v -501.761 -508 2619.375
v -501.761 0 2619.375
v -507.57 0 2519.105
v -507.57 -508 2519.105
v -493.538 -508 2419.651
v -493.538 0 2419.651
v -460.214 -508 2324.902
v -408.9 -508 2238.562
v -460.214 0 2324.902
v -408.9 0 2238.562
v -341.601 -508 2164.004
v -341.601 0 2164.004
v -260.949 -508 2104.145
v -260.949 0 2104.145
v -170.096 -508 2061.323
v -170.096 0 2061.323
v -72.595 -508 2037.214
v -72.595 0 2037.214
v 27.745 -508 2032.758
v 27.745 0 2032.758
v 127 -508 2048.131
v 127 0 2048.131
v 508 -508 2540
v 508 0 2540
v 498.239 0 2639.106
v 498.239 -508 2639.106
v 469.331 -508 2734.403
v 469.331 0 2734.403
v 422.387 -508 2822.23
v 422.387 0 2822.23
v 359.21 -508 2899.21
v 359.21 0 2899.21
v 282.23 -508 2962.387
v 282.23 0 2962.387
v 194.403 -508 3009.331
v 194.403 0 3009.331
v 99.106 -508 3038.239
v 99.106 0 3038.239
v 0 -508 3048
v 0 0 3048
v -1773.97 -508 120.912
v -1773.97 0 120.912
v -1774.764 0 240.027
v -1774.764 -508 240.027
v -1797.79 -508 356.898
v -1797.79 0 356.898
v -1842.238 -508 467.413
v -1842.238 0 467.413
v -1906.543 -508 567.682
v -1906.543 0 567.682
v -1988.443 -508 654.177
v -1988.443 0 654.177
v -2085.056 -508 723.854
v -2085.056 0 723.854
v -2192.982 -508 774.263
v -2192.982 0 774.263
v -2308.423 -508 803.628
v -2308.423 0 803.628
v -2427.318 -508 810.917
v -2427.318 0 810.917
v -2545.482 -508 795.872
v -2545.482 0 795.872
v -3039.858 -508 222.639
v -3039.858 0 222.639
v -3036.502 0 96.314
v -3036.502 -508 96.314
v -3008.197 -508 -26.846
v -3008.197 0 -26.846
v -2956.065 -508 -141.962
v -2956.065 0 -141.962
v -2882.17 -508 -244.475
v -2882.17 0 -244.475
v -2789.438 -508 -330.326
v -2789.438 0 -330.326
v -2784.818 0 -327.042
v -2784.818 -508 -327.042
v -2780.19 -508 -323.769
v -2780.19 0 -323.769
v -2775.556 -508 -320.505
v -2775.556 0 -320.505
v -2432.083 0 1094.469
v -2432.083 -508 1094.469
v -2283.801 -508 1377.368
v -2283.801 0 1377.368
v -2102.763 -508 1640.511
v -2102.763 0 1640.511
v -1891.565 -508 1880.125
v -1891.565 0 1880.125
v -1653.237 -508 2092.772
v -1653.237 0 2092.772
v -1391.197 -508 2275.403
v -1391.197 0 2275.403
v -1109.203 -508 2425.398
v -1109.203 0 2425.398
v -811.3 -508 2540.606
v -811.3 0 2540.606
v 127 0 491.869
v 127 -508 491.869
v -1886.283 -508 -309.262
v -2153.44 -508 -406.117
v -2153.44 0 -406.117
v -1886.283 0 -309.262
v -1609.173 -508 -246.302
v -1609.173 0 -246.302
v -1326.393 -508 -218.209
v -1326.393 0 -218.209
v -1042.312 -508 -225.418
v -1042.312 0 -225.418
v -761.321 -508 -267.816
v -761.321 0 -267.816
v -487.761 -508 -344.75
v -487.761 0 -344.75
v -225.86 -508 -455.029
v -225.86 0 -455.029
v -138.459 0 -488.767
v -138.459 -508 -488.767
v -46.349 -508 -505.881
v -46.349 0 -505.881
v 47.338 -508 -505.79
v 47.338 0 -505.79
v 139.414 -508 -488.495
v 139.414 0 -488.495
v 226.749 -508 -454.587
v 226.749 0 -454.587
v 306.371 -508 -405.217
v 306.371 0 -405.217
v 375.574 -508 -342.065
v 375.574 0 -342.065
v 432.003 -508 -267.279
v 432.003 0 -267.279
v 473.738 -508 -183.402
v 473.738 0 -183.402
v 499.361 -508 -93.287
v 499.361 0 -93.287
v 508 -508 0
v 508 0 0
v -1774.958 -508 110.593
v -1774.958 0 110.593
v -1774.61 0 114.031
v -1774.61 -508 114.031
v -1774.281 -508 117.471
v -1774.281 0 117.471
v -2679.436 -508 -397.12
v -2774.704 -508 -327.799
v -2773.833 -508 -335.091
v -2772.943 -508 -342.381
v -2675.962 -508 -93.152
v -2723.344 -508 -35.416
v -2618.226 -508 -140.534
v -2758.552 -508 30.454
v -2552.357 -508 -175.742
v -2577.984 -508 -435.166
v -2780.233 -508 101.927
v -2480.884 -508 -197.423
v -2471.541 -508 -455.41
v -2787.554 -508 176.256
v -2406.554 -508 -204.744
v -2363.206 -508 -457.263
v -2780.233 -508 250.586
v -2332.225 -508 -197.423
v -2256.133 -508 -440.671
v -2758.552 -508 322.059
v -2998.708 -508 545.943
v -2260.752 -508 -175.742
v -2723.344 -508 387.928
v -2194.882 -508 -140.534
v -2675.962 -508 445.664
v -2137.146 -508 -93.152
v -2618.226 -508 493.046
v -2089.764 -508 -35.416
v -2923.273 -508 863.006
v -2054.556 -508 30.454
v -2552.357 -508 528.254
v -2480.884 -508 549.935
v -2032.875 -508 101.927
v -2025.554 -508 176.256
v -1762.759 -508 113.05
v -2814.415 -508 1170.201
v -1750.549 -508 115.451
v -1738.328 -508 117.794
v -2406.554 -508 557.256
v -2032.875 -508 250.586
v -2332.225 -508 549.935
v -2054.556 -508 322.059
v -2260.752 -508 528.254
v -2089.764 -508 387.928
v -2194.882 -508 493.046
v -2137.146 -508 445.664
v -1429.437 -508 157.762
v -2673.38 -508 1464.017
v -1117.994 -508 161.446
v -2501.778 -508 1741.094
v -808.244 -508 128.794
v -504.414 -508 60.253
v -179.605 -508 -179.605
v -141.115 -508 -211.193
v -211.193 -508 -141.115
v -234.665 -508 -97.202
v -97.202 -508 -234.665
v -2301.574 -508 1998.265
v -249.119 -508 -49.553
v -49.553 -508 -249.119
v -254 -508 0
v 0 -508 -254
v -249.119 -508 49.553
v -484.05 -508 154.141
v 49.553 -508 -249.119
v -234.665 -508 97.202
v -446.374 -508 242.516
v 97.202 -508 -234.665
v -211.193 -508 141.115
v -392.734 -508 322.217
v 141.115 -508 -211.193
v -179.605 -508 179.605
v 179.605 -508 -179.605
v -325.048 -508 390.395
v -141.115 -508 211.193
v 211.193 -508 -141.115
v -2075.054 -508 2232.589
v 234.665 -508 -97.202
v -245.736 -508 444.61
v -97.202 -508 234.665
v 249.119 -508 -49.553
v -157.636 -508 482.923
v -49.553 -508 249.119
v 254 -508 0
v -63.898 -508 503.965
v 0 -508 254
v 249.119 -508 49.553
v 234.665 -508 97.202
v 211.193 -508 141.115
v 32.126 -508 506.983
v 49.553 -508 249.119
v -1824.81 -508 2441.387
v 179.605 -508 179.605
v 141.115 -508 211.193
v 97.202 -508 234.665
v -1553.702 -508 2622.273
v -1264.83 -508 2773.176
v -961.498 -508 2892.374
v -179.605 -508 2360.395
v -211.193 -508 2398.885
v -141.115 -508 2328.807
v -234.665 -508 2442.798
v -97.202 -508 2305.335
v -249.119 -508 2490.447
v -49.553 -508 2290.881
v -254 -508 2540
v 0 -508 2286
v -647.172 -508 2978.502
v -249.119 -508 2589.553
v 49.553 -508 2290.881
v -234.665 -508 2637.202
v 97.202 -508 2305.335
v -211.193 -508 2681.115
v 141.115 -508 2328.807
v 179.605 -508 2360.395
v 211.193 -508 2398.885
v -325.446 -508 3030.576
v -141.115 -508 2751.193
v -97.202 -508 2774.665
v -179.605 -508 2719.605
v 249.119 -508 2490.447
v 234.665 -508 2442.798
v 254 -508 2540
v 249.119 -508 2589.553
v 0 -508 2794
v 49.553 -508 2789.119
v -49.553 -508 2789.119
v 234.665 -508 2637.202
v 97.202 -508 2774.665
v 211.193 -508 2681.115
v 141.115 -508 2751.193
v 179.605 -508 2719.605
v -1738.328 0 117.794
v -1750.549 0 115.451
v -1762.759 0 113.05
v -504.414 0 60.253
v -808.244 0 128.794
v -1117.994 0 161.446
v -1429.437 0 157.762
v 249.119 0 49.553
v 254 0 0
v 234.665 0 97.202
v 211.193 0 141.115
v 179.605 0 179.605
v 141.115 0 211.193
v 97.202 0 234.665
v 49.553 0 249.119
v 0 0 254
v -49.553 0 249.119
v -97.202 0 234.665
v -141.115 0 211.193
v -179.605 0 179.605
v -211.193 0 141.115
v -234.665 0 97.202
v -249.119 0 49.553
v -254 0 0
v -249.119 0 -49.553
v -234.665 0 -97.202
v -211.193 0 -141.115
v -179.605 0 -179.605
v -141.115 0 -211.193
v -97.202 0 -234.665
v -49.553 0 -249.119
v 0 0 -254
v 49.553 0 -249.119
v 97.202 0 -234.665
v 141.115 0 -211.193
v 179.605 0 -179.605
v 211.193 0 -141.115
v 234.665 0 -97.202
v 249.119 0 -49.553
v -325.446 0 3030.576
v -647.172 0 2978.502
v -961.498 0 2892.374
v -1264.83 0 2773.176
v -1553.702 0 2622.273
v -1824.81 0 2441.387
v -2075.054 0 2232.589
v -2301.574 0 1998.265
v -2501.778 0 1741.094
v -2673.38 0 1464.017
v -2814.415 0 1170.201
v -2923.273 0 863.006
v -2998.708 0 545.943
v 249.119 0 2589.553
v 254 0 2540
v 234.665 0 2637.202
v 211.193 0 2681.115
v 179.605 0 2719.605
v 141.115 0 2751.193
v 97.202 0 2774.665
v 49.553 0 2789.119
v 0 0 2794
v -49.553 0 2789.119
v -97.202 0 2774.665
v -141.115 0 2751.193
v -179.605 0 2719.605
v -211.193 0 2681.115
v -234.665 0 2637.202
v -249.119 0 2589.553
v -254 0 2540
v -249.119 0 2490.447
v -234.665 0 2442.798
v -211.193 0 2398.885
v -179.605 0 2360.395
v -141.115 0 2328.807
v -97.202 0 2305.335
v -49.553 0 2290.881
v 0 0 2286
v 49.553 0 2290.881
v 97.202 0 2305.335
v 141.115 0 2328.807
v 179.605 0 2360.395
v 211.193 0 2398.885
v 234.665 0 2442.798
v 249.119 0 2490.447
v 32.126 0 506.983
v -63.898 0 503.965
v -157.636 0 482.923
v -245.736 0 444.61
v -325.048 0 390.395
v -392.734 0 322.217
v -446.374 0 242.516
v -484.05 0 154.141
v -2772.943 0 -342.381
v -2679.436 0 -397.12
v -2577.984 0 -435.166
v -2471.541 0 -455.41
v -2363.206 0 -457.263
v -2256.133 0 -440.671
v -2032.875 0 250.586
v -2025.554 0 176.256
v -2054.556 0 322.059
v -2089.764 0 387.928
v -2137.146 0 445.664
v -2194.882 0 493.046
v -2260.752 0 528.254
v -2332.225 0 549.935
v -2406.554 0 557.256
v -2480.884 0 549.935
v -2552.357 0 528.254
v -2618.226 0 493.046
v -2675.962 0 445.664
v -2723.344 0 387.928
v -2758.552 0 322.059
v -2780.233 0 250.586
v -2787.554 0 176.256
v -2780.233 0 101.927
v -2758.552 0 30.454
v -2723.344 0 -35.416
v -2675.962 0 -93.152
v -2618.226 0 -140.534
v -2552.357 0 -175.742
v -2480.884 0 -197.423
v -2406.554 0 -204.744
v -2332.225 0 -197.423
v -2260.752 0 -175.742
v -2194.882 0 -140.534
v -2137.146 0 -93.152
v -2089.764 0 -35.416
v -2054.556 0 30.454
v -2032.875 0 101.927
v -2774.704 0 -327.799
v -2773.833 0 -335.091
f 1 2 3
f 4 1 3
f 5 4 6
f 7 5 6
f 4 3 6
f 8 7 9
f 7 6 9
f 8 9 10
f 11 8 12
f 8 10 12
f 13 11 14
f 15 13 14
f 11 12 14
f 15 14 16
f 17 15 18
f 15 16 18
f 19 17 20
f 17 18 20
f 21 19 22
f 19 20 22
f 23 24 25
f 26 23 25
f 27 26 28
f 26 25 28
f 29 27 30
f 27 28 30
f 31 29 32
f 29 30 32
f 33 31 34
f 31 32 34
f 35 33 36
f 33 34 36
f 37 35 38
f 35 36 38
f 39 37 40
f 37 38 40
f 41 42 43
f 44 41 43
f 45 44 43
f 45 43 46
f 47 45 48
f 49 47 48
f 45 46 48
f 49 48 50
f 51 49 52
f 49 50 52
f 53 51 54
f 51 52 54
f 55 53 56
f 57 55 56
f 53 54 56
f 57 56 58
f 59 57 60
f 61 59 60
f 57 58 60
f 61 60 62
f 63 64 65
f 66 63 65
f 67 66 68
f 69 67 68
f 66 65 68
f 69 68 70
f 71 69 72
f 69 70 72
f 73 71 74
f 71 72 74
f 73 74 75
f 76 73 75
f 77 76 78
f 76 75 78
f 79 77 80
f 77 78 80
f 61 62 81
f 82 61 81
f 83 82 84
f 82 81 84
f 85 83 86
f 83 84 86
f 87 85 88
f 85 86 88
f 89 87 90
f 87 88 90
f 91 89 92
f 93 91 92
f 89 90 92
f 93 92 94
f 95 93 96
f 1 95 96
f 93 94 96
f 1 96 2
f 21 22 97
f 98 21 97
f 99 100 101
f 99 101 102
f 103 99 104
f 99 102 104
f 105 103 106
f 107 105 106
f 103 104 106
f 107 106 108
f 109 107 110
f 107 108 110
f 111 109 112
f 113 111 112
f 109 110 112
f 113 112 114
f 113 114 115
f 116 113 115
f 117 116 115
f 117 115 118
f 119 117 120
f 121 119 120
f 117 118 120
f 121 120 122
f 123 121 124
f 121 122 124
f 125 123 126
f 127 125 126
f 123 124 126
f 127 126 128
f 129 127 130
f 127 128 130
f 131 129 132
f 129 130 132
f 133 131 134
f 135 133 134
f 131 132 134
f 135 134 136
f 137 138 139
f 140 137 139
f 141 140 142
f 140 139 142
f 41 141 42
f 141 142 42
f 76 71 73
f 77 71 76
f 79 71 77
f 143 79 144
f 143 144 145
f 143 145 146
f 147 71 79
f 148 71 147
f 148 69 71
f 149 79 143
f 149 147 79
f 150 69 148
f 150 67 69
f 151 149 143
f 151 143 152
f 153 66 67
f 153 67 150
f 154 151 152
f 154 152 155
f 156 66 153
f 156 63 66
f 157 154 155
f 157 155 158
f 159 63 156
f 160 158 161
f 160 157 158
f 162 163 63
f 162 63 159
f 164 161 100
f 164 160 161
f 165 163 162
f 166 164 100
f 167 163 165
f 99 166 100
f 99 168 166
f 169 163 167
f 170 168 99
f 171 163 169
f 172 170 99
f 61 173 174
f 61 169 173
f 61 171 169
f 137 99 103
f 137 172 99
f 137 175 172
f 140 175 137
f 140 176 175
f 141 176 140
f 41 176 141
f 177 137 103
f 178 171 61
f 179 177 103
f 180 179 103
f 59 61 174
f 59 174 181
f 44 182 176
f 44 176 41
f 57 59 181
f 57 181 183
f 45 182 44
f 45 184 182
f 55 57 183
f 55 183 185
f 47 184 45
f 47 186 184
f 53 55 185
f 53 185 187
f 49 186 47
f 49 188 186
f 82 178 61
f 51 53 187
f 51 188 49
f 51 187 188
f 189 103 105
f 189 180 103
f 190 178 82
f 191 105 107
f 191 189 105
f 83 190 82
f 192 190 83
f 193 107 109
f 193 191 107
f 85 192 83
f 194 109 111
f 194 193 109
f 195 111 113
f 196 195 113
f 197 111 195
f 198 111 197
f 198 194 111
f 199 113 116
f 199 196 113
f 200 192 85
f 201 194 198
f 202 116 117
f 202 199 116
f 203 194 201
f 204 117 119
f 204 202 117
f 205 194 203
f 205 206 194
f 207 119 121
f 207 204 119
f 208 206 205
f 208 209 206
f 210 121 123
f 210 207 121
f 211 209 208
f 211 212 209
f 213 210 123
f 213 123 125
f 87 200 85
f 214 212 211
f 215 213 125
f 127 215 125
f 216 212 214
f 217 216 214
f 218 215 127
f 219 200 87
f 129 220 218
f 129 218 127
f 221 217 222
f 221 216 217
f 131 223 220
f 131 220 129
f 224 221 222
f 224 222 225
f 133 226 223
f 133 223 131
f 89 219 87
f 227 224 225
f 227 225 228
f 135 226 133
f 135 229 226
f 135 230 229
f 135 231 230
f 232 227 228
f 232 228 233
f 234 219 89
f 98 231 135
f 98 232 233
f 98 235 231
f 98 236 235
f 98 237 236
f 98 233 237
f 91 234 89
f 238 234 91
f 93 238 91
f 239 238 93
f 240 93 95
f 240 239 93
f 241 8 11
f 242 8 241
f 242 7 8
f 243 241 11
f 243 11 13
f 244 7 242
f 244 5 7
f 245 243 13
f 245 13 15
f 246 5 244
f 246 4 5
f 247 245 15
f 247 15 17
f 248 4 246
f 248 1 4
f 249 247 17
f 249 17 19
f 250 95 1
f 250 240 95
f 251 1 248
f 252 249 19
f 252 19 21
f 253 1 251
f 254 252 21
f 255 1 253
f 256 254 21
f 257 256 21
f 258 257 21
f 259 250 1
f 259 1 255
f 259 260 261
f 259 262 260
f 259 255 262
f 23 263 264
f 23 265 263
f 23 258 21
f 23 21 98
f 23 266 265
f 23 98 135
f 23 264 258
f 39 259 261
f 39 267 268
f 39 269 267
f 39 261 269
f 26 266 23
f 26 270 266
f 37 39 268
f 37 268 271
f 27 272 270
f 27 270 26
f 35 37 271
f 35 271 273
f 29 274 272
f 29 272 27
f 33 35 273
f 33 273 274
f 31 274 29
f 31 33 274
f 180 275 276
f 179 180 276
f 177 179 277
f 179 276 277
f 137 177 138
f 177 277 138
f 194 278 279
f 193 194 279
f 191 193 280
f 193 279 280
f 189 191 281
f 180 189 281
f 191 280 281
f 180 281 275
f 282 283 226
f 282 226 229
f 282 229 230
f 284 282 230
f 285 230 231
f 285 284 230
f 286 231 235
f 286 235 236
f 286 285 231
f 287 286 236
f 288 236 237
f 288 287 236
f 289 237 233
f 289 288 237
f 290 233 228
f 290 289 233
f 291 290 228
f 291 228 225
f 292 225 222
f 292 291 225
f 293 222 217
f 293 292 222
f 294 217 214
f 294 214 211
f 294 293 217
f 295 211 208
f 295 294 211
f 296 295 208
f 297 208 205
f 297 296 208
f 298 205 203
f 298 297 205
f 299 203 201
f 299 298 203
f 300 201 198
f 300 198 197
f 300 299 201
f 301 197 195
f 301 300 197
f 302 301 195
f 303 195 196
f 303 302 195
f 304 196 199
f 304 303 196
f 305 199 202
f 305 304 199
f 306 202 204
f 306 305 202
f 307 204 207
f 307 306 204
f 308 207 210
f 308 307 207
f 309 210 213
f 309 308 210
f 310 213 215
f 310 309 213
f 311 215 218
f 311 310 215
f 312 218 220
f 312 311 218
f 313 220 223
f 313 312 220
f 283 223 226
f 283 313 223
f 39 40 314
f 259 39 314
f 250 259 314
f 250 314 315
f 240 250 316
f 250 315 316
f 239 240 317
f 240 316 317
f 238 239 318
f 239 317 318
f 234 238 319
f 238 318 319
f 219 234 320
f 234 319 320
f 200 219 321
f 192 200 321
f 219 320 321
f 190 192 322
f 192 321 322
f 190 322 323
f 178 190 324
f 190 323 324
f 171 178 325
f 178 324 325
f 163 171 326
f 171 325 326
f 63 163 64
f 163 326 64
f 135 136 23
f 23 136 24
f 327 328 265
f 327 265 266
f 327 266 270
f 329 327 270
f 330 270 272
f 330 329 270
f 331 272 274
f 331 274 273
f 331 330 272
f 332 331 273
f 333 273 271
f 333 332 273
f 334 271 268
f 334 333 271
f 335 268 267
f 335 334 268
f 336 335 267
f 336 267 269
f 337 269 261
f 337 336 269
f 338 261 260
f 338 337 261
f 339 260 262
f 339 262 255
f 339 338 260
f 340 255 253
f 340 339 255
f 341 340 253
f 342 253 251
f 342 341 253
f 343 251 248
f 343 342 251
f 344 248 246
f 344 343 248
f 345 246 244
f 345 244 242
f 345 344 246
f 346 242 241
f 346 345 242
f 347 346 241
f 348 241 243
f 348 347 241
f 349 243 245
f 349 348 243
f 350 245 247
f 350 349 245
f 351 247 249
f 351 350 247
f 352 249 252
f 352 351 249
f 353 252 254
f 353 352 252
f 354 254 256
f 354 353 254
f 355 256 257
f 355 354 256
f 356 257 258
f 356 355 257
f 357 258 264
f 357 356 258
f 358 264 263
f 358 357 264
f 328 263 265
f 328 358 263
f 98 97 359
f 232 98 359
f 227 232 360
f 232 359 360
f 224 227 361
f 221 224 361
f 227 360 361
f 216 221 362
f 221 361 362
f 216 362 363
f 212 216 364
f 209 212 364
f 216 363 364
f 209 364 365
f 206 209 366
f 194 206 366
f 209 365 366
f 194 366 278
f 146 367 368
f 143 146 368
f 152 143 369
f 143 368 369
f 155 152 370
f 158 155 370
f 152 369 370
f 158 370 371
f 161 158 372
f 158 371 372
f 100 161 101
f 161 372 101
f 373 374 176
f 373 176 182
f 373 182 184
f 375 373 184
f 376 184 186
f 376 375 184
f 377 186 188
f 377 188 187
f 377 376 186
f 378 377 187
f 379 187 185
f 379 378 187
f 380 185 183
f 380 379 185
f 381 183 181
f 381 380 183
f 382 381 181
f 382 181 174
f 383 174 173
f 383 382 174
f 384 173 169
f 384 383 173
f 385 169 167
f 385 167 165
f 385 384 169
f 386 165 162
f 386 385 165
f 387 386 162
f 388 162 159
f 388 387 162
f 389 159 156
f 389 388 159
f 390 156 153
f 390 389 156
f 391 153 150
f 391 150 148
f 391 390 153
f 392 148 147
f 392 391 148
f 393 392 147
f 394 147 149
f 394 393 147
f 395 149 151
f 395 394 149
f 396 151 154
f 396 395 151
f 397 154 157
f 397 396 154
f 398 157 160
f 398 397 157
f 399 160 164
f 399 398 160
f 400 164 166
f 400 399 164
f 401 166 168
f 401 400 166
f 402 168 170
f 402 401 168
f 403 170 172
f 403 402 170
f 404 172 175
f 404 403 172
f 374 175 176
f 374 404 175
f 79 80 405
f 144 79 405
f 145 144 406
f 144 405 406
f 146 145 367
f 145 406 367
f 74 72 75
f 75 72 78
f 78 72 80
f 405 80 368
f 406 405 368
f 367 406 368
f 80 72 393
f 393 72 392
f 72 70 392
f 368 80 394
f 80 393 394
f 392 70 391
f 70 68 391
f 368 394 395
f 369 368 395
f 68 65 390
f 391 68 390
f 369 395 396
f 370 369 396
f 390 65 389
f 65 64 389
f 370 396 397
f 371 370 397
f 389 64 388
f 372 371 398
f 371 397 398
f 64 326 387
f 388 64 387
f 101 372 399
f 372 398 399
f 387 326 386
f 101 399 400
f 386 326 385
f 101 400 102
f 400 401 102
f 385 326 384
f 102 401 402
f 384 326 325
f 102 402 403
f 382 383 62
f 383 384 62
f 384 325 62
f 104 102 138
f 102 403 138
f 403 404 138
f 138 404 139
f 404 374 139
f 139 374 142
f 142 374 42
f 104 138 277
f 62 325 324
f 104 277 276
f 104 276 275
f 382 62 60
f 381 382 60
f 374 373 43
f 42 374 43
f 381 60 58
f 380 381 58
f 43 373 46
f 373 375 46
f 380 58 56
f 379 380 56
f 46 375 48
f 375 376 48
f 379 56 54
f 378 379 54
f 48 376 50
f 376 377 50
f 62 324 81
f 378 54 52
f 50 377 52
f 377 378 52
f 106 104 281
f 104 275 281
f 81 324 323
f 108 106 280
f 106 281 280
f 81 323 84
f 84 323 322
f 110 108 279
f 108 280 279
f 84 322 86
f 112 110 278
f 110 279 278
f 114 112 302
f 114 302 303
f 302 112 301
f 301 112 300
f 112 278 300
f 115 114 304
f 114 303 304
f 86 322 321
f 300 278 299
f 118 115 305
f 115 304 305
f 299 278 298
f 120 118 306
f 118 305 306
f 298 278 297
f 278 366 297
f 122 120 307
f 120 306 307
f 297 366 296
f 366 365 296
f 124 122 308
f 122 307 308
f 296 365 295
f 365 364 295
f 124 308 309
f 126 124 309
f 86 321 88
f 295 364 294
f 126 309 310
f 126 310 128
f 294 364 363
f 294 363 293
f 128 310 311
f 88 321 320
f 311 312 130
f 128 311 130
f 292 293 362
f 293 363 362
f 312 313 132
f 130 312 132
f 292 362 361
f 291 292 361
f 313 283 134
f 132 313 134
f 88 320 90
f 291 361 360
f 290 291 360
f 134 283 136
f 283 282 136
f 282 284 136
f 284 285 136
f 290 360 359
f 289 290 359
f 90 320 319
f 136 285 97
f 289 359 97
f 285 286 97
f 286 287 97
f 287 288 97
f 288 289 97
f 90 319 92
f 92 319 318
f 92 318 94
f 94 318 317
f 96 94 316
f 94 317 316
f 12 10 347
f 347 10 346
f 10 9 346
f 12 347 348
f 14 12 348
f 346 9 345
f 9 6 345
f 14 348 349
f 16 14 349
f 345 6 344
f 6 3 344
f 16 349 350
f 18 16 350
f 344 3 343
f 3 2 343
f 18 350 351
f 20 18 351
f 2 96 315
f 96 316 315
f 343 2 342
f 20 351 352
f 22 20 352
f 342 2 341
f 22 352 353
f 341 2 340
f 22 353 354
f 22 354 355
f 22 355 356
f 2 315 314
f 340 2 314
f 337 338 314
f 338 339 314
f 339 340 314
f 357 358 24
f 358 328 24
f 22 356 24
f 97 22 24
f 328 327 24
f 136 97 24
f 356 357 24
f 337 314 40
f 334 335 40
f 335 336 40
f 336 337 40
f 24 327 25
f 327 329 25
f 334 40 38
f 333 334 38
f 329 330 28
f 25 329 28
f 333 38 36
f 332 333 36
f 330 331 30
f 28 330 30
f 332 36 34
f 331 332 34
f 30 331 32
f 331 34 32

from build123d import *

# Parameters (mm, degrees)
F0_R     = 381
F0_R_2   = 254
F1_DEPTH = 508


with BuildPart() as f1:
    # F0 (on Front) → F1 (new body)
    with BuildSketch(Plane.XZ):
        with BuildLine():
            ThreePointArc((-2153.439948, -406.116764), (-1184.240499, -217.394864), (-225.8598, -455.028956))
            ThreePointArc((-225.8598, -455.028956), (267.700599, -431.741114), (508, 0))
            Line((508, 0), (508, 2540))
            ThreePointArc((508, 2540), (359.210245, 2899.210245), (0, 3048))
            ThreePointArc((0, 3048), (-2075.054127, 2232.589162), (-3039.857845, 222.639349))
            ThreePointArc((-3039.857845, 222.639349), (-2985.001858, -85.704194), (-2789.437832, -330.325598))
            ThreePointArc((-2789.437832, -330.325598), (-2782.50486, -325.404341), (-2775.556234, -320.505209))
            ThreePointArc((-2775.556234, -320.505209), (-2774.271038, -331.445636), (-2772.942717, -342.38091))
            ThreePointArc((-2772.942717, -342.38091), (-2471.54134, -455.409632), (-2153.439948, -406.116764))
        make_face()
        with Locations((-2406.554128, 176.256151)):
            Circle(F0_R, mode=Mode.SUBTRACT)
        Circle(F0_R_2, mode=Mode.SUBTRACT)
        with BuildLine():
            ThreePointArc((-1738.327809, 117.793924), (-1756.655618, 114.25766), (-1774.95823, 110.593211))
            ThreePointArc((-1774.95823, 110.593211), (-1774.443305, 115.750717), (-1773.970494, 120.912255))
            ThreePointArc((-1773.970494, 120.912255), (-1988.44304, 654.17677), (-2545.481542, 795.872302))
            ThreePointArc((-2545.481542, 795.872302), (-1775.587664, 1990.019459), (-501.76051, 2619.375))
            ThreePointArc((-501.76051, 2619.375), (-341.601016, 2164.004327), (127, 2048.131115))
            Line((127, 2048.131115), (127, 491.868885))
            ThreePointArc((127, 491.868885), (-286.676576, 419.38114), (-504.414113, 60.252824))
            ThreePointArc((-504.414113, 60.252824), (-1117.993696, 161.445586), (-1738.327809, 117.793924))
        make_face(mode=Mode.SUBTRACT)
        with Locations((0, 2540)):
            Circle(F0_R_2, mode=Mode.SUBTRACT)
    extrude(amount=F1_DEPTH)


solid = f1.part
